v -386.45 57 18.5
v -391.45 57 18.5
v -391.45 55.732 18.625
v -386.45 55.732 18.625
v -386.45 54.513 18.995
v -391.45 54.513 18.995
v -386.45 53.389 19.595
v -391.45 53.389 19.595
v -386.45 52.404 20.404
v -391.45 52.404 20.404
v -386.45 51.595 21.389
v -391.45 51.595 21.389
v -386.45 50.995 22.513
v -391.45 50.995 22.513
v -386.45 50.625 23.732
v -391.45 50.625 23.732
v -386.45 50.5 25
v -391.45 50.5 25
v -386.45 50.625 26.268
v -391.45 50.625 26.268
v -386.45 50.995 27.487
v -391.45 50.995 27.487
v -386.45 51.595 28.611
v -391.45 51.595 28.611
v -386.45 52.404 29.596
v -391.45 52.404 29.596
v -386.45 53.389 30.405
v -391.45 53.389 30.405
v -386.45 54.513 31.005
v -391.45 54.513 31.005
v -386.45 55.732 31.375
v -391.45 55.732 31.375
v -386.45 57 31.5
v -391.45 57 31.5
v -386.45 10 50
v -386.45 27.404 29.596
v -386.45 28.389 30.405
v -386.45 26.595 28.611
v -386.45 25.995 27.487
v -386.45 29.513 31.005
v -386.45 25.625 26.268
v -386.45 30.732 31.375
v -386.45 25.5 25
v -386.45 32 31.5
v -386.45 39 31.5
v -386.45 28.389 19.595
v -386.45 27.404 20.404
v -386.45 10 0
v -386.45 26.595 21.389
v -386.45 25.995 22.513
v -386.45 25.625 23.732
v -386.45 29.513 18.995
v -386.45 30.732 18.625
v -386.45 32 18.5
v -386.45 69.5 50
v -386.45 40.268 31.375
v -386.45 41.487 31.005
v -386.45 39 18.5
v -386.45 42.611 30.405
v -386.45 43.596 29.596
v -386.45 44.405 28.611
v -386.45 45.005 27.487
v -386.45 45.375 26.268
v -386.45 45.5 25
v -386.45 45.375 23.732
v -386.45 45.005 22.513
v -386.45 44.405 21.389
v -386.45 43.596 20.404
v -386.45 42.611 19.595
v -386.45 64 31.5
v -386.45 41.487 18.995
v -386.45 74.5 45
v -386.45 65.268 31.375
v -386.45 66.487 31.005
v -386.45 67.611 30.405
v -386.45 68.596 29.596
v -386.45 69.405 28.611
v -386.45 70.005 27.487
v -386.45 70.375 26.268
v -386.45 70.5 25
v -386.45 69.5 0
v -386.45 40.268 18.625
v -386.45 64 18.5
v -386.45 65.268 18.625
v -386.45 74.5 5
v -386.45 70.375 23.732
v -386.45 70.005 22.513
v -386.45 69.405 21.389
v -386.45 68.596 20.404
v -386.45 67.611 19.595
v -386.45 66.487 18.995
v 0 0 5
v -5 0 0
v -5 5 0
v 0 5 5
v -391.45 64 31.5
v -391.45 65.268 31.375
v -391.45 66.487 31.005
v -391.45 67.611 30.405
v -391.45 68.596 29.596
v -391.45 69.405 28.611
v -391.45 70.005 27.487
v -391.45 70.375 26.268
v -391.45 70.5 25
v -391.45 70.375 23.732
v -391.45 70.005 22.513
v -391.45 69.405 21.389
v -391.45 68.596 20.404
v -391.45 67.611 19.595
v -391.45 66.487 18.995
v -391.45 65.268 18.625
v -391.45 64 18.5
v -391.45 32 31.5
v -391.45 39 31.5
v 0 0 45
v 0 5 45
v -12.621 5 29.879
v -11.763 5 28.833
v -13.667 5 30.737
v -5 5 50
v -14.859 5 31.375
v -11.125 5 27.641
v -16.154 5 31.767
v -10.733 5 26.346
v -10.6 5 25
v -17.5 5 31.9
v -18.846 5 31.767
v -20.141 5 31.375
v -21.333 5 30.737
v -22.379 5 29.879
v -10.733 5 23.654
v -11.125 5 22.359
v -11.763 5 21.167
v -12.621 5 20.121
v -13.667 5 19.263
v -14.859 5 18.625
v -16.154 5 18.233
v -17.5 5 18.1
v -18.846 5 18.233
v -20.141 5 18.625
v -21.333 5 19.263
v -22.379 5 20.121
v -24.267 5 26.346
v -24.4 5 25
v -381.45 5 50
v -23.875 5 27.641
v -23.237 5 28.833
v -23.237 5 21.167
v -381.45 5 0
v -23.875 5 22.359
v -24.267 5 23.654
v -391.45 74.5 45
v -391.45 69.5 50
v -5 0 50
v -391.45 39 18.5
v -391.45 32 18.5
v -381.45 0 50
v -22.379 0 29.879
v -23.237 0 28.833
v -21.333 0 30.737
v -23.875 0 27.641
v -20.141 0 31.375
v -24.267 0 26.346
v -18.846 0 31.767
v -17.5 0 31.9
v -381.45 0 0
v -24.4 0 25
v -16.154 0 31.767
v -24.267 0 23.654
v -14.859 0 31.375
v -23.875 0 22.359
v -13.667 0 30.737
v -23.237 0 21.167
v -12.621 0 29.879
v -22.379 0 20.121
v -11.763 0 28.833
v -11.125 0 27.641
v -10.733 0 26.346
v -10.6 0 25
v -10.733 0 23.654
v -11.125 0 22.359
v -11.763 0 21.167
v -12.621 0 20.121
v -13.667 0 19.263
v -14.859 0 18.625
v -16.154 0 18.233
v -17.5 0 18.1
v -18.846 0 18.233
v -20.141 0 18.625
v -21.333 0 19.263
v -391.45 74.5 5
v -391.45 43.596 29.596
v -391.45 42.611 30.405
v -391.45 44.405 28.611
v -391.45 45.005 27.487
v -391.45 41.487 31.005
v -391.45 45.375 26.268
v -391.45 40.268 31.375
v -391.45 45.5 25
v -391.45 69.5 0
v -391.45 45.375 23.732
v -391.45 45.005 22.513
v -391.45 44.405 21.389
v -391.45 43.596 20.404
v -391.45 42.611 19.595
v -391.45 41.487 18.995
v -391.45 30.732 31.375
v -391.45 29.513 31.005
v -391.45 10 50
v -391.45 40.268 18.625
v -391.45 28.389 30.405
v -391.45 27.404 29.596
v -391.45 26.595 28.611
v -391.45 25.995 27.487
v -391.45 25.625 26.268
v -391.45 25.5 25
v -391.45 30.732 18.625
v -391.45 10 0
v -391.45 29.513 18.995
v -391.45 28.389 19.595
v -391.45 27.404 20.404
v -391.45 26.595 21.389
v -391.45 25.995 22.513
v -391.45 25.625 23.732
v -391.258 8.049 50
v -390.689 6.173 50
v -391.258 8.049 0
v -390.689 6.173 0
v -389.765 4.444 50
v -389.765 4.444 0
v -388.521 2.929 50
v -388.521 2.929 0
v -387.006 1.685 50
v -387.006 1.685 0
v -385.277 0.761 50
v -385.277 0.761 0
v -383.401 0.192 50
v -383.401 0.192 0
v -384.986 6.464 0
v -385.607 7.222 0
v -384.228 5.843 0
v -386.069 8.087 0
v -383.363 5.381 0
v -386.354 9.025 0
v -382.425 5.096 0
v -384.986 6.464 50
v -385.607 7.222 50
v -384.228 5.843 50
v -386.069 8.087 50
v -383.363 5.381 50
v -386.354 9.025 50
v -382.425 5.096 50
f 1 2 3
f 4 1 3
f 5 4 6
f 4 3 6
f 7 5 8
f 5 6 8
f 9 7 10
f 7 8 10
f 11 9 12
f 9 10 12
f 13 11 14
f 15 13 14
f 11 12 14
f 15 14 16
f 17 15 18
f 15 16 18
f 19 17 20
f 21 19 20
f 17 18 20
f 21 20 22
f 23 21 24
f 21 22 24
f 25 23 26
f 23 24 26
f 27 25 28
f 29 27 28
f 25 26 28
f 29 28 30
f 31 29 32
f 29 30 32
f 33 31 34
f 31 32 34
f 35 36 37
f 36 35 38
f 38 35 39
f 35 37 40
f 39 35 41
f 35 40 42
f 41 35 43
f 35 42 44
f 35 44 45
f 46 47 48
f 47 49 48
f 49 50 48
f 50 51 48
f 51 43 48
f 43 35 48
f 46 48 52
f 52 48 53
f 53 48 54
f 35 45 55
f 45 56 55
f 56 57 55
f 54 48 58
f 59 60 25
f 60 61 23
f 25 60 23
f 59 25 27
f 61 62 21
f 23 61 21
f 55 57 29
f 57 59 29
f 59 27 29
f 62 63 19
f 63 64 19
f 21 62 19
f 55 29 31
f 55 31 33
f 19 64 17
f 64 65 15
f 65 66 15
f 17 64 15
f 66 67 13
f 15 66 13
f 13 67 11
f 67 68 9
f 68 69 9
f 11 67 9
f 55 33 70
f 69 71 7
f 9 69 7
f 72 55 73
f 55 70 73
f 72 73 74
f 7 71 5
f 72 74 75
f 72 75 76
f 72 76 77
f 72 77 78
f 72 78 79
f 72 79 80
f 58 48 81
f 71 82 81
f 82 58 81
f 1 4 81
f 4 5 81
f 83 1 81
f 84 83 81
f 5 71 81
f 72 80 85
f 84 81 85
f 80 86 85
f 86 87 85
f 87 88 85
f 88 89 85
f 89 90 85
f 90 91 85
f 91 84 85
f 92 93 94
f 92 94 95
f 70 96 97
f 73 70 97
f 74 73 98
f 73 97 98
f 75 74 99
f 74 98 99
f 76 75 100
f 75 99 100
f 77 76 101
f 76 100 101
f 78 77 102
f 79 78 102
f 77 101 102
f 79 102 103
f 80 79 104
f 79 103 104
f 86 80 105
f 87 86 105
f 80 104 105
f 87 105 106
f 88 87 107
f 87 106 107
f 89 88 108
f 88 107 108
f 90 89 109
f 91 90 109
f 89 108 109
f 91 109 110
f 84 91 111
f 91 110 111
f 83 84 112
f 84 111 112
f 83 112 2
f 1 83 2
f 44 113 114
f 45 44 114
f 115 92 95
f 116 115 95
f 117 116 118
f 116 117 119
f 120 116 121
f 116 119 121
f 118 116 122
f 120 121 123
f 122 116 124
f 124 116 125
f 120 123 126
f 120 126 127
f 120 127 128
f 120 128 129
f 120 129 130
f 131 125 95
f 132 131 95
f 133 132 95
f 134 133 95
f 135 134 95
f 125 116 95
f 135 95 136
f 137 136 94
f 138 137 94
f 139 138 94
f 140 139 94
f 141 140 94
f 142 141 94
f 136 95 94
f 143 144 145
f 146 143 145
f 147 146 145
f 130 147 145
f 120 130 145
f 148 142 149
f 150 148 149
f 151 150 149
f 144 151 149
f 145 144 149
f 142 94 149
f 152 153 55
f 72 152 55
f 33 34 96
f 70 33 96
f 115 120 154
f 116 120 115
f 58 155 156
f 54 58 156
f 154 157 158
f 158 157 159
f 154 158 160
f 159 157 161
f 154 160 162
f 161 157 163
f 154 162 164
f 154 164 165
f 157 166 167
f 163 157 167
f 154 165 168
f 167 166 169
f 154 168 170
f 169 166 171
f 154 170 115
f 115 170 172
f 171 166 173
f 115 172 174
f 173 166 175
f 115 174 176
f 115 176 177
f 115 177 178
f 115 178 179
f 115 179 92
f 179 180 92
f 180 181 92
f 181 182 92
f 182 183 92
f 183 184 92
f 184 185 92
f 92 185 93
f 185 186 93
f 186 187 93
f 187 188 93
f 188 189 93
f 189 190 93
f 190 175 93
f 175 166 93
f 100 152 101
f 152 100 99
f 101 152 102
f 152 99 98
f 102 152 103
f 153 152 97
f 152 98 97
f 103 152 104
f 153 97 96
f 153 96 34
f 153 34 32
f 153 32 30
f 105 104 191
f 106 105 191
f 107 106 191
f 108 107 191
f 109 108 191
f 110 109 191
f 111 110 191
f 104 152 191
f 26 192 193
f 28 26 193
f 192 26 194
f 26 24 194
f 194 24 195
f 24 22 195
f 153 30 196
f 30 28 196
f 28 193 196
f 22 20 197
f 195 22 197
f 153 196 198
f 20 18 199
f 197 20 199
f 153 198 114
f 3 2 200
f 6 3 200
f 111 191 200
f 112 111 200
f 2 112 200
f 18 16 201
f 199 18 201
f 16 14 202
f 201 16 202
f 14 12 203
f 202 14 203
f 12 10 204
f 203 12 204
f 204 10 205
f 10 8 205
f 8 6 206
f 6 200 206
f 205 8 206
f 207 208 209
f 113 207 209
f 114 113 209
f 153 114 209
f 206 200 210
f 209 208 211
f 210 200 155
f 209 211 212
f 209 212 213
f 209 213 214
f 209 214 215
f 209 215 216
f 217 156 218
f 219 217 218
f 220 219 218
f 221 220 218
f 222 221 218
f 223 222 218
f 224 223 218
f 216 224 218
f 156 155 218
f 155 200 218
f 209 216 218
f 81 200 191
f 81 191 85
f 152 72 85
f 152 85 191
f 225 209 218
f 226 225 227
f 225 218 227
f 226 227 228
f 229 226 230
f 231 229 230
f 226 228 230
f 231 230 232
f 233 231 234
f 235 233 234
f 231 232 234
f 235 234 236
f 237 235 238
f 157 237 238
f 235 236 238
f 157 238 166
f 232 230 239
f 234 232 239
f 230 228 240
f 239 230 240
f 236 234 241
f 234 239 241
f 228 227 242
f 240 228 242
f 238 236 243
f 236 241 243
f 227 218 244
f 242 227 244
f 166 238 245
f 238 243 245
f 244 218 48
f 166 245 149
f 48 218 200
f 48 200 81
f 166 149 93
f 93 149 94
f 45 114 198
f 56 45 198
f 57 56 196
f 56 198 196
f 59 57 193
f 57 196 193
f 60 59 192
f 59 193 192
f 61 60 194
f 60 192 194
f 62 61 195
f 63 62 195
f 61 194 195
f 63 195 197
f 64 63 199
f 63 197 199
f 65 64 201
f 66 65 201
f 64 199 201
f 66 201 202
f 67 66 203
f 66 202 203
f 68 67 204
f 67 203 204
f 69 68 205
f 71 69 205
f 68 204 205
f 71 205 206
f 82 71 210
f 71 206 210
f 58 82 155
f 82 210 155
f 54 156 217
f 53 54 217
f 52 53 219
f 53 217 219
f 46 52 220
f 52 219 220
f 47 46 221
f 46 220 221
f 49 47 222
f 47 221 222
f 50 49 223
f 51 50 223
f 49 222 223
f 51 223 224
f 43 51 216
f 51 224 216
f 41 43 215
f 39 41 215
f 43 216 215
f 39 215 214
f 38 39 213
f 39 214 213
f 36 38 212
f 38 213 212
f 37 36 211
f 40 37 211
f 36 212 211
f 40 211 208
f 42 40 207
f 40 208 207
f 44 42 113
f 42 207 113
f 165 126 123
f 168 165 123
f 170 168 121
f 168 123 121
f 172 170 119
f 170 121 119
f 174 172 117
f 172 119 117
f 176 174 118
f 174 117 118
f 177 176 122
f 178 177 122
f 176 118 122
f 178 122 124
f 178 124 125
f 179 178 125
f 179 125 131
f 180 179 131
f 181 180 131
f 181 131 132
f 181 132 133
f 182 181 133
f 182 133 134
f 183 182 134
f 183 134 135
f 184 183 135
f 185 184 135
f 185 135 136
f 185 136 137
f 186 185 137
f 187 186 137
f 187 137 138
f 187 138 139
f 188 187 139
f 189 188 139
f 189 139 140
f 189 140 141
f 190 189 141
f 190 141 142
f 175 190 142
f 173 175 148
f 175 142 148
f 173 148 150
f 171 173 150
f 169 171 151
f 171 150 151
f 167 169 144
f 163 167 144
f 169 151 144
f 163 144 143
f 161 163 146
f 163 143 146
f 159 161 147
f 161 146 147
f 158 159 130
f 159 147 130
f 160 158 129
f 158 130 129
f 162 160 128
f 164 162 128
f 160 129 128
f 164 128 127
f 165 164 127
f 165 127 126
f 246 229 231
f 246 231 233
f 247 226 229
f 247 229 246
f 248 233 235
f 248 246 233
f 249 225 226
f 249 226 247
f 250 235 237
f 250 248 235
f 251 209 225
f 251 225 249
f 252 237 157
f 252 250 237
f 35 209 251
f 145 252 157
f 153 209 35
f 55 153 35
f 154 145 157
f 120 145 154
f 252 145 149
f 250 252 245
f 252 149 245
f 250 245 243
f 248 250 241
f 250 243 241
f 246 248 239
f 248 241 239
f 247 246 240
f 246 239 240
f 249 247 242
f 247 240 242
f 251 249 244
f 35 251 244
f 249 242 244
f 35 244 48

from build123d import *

# Parameters (mm, degrees)
SM_BASE_FLANGE_1_DEPTH = 50
SKETCH_3_R             = 6.9
CUT_EXTRUDE_2_DEPTH    = 10
SKETCH_4_R             = 6.5
CUT_EXTRUDE_3_DEPTH    = 10
OTHER_START            = 49.143921292
OTHER_1_OUTLINE_W      = 8
OTHER_1_OUTLINE_H      = 38
OTHER_1_DEPTH          = 3.535533906
OTHER_START_2          = 84.499260352
OTHER_1_2_OUTLINE_W    = 8
OTHER_1_2_OUTLINE_H    = 10
OTHER_1_2_DEPTH        = 3.535533906
OTHER_START_3          = -3.535533906
OTHER_1_3_OUTLINE_W    = 10
OTHER_1_3_OUTLINE_H    = 7
OTHER_1_3_DEPTH        = 3.535533906
OTHER_START_4          = 31.819805153
OTHER_1_4_OUTLINE_W    = 38
OTHER_1_4_OUTLINE_H    = 7
OTHER_1_4_DEPTH        = 3.535533906


# Read off the part's stored shape, not the designer's step: Затупленный угол1
# Sheet-metal steps are written as plain solids
with BuildPart() as part:
    # Sketch 1 → Базовая кромка1 (new body)
    with BuildSketch(Plane.XY):
        with BuildLine():
            Line((-391.45, 74.5), (-391.45, 10))
            ThreePointArc((-391.45, 10), (-388.521067812, 2.928932188), (-381.45, 0))
            Line((-381.45, 0), (0, 0))
            Line((0, 0), (0, 5))
            Line((0, 5), (-381.45, 5))
            ThreePointArc((-381.45, 5), (-384.985533906, 6.464466094), (-386.45, 10))
            Line((-386.45, 10), (-386.45, 74.5))
            Line((-386.45, 74.5), (-391.45, 74.5))
        make_face()
    extrude(amount=SM_BASE_FLANGE_1_DEPTH)

    # Эскиз3 → Вырез-Вытянуть2 (cut)
    with BuildSketch(Plane(origin=(0, 5, 0), x_dir=(1, 0, 0), z_dir=(0, 1, 0))):
        with Locations(Location((-17.5, -25, 0), (0, 0, 270))):
            Circle(SKETCH_3_R)
    extrude(amount=-CUT_EXTRUDE_2_DEPTH, mode=Mode.SUBTRACT)

    # Эскиз4 → Вырез-Вытянуть3 (cut)
    with BuildSketch(Plane.ZY.offset(391.45)):
        with BuildLine():
            Line((31.5, 32), (31.5, 35.5))
            ThreePointArc((31.5, 35.5), (25, 29), (18.5, 35.5))
            Line((18.5, 35.5), (18.5, 32))
            ThreePointArc((18.5, 32), (25, 25.5), (31.5, 32))
        make_face()
        with Locations((25, 35.5)):
            Circle(SKETCH_4_R)
        with BuildLine():
            Line((31.5, 35.5), (31.5, 39))
            ThreePointArc((31.5, 39), (25, 45.5), (18.5, 39))
            Line((18.5, 39), (18.5, 35.5))
            ThreePointArc((18.5, 35.5), (25, 42), (31.5, 35.5))
        make_face()
        with BuildLine():
            Line((31.5, 57), (31.5, 60.5))
            ThreePointArc((31.5, 60.5), (25, 54), (18.5, 60.5))
            Line((18.5, 60.5), (18.5, 57))
            ThreePointArc((18.5, 57), (25, 50.5), (31.5, 57))
        make_face()
        with Locations((25, 60.5)):
            Circle(SKETCH_4_R)
        with BuildLine():
            Line((31.5, 60.5), (31.5, 64))
            ThreePointArc((31.5, 64), (25, 70.5), (18.5, 64))
            Line((18.5, 64), (18.5, 60.5))
            ThreePointArc((18.5, 60.5), (25, 67), (31.5, 60.5))
        make_face()
    extrude(amount=-CUT_EXTRUDE_3_DEPTH, mode=Mode.SUBTRACT)

    # Other 1 outline → Other 1 (cut)
    with BuildSketch(Plane(origin=(0, 0, 0), x_dir=(1, 0, 0), z_dir=(0, 0.7071067811865476, -0.7071067811865476)).offset(OTHER_START)):
        with Locations((-389, -67)):
            Rectangle(OTHER_1_OUTLINE_W, OTHER_1_OUTLINE_H)
    extrude(amount=OTHER_1_DEPTH, mode=Mode.SUBTRACT)

    # Other 1 2 outline → Other 1 2 (cut)
    with BuildSketch(Plane(origin=(0, 0, 0), x_dir=(1, 0, 0), z_dir=(0, 0.7071067811865476, 0.7071067811865476)).offset(OTHER_START_2)):
        with Locations((-389, 17)):
            Rectangle(OTHER_1_2_OUTLINE_W, OTHER_1_2_OUTLINE_H)
    extrude(amount=OTHER_1_2_DEPTH, mode=Mode.SUBTRACT)

    # Other 1 3 outline → Other 1 3 (cut)
    with BuildSketch(Plane(origin=(0, 0, 0), x_dir=(0.707106781186549, 0, 0.707106781186546), z_dir=(0.707106781186546, 0, -0.707106781186549)).offset(OTHER_START_3)):
        with Locations((0, -2.5)):
            Rectangle(OTHER_1_3_OUTLINE_W, OTHER_1_3_OUTLINE_H)
    extrude(amount=OTHER_1_3_DEPTH, mode=Mode.SUBTRACT)

    # Other 1 4 outline → Other 1 4 (cut)
    with BuildSketch(Plane(origin=(0, 0, 0), x_dir=(0.707106781186549, 0, -0.707106781186546), z_dir=(0.707106781186546, 0, 0.707106781186549)).offset(OTHER_START_4)):
        with Locations((-21, 2.5)):
            Rectangle(OTHER_1_4_OUTLINE_W, OTHER_1_4_OUTLINE_H)
    extrude(amount=OTHER_1_4_DEPTH, mode=Mode.SUBTRACT)


solid = part.part
